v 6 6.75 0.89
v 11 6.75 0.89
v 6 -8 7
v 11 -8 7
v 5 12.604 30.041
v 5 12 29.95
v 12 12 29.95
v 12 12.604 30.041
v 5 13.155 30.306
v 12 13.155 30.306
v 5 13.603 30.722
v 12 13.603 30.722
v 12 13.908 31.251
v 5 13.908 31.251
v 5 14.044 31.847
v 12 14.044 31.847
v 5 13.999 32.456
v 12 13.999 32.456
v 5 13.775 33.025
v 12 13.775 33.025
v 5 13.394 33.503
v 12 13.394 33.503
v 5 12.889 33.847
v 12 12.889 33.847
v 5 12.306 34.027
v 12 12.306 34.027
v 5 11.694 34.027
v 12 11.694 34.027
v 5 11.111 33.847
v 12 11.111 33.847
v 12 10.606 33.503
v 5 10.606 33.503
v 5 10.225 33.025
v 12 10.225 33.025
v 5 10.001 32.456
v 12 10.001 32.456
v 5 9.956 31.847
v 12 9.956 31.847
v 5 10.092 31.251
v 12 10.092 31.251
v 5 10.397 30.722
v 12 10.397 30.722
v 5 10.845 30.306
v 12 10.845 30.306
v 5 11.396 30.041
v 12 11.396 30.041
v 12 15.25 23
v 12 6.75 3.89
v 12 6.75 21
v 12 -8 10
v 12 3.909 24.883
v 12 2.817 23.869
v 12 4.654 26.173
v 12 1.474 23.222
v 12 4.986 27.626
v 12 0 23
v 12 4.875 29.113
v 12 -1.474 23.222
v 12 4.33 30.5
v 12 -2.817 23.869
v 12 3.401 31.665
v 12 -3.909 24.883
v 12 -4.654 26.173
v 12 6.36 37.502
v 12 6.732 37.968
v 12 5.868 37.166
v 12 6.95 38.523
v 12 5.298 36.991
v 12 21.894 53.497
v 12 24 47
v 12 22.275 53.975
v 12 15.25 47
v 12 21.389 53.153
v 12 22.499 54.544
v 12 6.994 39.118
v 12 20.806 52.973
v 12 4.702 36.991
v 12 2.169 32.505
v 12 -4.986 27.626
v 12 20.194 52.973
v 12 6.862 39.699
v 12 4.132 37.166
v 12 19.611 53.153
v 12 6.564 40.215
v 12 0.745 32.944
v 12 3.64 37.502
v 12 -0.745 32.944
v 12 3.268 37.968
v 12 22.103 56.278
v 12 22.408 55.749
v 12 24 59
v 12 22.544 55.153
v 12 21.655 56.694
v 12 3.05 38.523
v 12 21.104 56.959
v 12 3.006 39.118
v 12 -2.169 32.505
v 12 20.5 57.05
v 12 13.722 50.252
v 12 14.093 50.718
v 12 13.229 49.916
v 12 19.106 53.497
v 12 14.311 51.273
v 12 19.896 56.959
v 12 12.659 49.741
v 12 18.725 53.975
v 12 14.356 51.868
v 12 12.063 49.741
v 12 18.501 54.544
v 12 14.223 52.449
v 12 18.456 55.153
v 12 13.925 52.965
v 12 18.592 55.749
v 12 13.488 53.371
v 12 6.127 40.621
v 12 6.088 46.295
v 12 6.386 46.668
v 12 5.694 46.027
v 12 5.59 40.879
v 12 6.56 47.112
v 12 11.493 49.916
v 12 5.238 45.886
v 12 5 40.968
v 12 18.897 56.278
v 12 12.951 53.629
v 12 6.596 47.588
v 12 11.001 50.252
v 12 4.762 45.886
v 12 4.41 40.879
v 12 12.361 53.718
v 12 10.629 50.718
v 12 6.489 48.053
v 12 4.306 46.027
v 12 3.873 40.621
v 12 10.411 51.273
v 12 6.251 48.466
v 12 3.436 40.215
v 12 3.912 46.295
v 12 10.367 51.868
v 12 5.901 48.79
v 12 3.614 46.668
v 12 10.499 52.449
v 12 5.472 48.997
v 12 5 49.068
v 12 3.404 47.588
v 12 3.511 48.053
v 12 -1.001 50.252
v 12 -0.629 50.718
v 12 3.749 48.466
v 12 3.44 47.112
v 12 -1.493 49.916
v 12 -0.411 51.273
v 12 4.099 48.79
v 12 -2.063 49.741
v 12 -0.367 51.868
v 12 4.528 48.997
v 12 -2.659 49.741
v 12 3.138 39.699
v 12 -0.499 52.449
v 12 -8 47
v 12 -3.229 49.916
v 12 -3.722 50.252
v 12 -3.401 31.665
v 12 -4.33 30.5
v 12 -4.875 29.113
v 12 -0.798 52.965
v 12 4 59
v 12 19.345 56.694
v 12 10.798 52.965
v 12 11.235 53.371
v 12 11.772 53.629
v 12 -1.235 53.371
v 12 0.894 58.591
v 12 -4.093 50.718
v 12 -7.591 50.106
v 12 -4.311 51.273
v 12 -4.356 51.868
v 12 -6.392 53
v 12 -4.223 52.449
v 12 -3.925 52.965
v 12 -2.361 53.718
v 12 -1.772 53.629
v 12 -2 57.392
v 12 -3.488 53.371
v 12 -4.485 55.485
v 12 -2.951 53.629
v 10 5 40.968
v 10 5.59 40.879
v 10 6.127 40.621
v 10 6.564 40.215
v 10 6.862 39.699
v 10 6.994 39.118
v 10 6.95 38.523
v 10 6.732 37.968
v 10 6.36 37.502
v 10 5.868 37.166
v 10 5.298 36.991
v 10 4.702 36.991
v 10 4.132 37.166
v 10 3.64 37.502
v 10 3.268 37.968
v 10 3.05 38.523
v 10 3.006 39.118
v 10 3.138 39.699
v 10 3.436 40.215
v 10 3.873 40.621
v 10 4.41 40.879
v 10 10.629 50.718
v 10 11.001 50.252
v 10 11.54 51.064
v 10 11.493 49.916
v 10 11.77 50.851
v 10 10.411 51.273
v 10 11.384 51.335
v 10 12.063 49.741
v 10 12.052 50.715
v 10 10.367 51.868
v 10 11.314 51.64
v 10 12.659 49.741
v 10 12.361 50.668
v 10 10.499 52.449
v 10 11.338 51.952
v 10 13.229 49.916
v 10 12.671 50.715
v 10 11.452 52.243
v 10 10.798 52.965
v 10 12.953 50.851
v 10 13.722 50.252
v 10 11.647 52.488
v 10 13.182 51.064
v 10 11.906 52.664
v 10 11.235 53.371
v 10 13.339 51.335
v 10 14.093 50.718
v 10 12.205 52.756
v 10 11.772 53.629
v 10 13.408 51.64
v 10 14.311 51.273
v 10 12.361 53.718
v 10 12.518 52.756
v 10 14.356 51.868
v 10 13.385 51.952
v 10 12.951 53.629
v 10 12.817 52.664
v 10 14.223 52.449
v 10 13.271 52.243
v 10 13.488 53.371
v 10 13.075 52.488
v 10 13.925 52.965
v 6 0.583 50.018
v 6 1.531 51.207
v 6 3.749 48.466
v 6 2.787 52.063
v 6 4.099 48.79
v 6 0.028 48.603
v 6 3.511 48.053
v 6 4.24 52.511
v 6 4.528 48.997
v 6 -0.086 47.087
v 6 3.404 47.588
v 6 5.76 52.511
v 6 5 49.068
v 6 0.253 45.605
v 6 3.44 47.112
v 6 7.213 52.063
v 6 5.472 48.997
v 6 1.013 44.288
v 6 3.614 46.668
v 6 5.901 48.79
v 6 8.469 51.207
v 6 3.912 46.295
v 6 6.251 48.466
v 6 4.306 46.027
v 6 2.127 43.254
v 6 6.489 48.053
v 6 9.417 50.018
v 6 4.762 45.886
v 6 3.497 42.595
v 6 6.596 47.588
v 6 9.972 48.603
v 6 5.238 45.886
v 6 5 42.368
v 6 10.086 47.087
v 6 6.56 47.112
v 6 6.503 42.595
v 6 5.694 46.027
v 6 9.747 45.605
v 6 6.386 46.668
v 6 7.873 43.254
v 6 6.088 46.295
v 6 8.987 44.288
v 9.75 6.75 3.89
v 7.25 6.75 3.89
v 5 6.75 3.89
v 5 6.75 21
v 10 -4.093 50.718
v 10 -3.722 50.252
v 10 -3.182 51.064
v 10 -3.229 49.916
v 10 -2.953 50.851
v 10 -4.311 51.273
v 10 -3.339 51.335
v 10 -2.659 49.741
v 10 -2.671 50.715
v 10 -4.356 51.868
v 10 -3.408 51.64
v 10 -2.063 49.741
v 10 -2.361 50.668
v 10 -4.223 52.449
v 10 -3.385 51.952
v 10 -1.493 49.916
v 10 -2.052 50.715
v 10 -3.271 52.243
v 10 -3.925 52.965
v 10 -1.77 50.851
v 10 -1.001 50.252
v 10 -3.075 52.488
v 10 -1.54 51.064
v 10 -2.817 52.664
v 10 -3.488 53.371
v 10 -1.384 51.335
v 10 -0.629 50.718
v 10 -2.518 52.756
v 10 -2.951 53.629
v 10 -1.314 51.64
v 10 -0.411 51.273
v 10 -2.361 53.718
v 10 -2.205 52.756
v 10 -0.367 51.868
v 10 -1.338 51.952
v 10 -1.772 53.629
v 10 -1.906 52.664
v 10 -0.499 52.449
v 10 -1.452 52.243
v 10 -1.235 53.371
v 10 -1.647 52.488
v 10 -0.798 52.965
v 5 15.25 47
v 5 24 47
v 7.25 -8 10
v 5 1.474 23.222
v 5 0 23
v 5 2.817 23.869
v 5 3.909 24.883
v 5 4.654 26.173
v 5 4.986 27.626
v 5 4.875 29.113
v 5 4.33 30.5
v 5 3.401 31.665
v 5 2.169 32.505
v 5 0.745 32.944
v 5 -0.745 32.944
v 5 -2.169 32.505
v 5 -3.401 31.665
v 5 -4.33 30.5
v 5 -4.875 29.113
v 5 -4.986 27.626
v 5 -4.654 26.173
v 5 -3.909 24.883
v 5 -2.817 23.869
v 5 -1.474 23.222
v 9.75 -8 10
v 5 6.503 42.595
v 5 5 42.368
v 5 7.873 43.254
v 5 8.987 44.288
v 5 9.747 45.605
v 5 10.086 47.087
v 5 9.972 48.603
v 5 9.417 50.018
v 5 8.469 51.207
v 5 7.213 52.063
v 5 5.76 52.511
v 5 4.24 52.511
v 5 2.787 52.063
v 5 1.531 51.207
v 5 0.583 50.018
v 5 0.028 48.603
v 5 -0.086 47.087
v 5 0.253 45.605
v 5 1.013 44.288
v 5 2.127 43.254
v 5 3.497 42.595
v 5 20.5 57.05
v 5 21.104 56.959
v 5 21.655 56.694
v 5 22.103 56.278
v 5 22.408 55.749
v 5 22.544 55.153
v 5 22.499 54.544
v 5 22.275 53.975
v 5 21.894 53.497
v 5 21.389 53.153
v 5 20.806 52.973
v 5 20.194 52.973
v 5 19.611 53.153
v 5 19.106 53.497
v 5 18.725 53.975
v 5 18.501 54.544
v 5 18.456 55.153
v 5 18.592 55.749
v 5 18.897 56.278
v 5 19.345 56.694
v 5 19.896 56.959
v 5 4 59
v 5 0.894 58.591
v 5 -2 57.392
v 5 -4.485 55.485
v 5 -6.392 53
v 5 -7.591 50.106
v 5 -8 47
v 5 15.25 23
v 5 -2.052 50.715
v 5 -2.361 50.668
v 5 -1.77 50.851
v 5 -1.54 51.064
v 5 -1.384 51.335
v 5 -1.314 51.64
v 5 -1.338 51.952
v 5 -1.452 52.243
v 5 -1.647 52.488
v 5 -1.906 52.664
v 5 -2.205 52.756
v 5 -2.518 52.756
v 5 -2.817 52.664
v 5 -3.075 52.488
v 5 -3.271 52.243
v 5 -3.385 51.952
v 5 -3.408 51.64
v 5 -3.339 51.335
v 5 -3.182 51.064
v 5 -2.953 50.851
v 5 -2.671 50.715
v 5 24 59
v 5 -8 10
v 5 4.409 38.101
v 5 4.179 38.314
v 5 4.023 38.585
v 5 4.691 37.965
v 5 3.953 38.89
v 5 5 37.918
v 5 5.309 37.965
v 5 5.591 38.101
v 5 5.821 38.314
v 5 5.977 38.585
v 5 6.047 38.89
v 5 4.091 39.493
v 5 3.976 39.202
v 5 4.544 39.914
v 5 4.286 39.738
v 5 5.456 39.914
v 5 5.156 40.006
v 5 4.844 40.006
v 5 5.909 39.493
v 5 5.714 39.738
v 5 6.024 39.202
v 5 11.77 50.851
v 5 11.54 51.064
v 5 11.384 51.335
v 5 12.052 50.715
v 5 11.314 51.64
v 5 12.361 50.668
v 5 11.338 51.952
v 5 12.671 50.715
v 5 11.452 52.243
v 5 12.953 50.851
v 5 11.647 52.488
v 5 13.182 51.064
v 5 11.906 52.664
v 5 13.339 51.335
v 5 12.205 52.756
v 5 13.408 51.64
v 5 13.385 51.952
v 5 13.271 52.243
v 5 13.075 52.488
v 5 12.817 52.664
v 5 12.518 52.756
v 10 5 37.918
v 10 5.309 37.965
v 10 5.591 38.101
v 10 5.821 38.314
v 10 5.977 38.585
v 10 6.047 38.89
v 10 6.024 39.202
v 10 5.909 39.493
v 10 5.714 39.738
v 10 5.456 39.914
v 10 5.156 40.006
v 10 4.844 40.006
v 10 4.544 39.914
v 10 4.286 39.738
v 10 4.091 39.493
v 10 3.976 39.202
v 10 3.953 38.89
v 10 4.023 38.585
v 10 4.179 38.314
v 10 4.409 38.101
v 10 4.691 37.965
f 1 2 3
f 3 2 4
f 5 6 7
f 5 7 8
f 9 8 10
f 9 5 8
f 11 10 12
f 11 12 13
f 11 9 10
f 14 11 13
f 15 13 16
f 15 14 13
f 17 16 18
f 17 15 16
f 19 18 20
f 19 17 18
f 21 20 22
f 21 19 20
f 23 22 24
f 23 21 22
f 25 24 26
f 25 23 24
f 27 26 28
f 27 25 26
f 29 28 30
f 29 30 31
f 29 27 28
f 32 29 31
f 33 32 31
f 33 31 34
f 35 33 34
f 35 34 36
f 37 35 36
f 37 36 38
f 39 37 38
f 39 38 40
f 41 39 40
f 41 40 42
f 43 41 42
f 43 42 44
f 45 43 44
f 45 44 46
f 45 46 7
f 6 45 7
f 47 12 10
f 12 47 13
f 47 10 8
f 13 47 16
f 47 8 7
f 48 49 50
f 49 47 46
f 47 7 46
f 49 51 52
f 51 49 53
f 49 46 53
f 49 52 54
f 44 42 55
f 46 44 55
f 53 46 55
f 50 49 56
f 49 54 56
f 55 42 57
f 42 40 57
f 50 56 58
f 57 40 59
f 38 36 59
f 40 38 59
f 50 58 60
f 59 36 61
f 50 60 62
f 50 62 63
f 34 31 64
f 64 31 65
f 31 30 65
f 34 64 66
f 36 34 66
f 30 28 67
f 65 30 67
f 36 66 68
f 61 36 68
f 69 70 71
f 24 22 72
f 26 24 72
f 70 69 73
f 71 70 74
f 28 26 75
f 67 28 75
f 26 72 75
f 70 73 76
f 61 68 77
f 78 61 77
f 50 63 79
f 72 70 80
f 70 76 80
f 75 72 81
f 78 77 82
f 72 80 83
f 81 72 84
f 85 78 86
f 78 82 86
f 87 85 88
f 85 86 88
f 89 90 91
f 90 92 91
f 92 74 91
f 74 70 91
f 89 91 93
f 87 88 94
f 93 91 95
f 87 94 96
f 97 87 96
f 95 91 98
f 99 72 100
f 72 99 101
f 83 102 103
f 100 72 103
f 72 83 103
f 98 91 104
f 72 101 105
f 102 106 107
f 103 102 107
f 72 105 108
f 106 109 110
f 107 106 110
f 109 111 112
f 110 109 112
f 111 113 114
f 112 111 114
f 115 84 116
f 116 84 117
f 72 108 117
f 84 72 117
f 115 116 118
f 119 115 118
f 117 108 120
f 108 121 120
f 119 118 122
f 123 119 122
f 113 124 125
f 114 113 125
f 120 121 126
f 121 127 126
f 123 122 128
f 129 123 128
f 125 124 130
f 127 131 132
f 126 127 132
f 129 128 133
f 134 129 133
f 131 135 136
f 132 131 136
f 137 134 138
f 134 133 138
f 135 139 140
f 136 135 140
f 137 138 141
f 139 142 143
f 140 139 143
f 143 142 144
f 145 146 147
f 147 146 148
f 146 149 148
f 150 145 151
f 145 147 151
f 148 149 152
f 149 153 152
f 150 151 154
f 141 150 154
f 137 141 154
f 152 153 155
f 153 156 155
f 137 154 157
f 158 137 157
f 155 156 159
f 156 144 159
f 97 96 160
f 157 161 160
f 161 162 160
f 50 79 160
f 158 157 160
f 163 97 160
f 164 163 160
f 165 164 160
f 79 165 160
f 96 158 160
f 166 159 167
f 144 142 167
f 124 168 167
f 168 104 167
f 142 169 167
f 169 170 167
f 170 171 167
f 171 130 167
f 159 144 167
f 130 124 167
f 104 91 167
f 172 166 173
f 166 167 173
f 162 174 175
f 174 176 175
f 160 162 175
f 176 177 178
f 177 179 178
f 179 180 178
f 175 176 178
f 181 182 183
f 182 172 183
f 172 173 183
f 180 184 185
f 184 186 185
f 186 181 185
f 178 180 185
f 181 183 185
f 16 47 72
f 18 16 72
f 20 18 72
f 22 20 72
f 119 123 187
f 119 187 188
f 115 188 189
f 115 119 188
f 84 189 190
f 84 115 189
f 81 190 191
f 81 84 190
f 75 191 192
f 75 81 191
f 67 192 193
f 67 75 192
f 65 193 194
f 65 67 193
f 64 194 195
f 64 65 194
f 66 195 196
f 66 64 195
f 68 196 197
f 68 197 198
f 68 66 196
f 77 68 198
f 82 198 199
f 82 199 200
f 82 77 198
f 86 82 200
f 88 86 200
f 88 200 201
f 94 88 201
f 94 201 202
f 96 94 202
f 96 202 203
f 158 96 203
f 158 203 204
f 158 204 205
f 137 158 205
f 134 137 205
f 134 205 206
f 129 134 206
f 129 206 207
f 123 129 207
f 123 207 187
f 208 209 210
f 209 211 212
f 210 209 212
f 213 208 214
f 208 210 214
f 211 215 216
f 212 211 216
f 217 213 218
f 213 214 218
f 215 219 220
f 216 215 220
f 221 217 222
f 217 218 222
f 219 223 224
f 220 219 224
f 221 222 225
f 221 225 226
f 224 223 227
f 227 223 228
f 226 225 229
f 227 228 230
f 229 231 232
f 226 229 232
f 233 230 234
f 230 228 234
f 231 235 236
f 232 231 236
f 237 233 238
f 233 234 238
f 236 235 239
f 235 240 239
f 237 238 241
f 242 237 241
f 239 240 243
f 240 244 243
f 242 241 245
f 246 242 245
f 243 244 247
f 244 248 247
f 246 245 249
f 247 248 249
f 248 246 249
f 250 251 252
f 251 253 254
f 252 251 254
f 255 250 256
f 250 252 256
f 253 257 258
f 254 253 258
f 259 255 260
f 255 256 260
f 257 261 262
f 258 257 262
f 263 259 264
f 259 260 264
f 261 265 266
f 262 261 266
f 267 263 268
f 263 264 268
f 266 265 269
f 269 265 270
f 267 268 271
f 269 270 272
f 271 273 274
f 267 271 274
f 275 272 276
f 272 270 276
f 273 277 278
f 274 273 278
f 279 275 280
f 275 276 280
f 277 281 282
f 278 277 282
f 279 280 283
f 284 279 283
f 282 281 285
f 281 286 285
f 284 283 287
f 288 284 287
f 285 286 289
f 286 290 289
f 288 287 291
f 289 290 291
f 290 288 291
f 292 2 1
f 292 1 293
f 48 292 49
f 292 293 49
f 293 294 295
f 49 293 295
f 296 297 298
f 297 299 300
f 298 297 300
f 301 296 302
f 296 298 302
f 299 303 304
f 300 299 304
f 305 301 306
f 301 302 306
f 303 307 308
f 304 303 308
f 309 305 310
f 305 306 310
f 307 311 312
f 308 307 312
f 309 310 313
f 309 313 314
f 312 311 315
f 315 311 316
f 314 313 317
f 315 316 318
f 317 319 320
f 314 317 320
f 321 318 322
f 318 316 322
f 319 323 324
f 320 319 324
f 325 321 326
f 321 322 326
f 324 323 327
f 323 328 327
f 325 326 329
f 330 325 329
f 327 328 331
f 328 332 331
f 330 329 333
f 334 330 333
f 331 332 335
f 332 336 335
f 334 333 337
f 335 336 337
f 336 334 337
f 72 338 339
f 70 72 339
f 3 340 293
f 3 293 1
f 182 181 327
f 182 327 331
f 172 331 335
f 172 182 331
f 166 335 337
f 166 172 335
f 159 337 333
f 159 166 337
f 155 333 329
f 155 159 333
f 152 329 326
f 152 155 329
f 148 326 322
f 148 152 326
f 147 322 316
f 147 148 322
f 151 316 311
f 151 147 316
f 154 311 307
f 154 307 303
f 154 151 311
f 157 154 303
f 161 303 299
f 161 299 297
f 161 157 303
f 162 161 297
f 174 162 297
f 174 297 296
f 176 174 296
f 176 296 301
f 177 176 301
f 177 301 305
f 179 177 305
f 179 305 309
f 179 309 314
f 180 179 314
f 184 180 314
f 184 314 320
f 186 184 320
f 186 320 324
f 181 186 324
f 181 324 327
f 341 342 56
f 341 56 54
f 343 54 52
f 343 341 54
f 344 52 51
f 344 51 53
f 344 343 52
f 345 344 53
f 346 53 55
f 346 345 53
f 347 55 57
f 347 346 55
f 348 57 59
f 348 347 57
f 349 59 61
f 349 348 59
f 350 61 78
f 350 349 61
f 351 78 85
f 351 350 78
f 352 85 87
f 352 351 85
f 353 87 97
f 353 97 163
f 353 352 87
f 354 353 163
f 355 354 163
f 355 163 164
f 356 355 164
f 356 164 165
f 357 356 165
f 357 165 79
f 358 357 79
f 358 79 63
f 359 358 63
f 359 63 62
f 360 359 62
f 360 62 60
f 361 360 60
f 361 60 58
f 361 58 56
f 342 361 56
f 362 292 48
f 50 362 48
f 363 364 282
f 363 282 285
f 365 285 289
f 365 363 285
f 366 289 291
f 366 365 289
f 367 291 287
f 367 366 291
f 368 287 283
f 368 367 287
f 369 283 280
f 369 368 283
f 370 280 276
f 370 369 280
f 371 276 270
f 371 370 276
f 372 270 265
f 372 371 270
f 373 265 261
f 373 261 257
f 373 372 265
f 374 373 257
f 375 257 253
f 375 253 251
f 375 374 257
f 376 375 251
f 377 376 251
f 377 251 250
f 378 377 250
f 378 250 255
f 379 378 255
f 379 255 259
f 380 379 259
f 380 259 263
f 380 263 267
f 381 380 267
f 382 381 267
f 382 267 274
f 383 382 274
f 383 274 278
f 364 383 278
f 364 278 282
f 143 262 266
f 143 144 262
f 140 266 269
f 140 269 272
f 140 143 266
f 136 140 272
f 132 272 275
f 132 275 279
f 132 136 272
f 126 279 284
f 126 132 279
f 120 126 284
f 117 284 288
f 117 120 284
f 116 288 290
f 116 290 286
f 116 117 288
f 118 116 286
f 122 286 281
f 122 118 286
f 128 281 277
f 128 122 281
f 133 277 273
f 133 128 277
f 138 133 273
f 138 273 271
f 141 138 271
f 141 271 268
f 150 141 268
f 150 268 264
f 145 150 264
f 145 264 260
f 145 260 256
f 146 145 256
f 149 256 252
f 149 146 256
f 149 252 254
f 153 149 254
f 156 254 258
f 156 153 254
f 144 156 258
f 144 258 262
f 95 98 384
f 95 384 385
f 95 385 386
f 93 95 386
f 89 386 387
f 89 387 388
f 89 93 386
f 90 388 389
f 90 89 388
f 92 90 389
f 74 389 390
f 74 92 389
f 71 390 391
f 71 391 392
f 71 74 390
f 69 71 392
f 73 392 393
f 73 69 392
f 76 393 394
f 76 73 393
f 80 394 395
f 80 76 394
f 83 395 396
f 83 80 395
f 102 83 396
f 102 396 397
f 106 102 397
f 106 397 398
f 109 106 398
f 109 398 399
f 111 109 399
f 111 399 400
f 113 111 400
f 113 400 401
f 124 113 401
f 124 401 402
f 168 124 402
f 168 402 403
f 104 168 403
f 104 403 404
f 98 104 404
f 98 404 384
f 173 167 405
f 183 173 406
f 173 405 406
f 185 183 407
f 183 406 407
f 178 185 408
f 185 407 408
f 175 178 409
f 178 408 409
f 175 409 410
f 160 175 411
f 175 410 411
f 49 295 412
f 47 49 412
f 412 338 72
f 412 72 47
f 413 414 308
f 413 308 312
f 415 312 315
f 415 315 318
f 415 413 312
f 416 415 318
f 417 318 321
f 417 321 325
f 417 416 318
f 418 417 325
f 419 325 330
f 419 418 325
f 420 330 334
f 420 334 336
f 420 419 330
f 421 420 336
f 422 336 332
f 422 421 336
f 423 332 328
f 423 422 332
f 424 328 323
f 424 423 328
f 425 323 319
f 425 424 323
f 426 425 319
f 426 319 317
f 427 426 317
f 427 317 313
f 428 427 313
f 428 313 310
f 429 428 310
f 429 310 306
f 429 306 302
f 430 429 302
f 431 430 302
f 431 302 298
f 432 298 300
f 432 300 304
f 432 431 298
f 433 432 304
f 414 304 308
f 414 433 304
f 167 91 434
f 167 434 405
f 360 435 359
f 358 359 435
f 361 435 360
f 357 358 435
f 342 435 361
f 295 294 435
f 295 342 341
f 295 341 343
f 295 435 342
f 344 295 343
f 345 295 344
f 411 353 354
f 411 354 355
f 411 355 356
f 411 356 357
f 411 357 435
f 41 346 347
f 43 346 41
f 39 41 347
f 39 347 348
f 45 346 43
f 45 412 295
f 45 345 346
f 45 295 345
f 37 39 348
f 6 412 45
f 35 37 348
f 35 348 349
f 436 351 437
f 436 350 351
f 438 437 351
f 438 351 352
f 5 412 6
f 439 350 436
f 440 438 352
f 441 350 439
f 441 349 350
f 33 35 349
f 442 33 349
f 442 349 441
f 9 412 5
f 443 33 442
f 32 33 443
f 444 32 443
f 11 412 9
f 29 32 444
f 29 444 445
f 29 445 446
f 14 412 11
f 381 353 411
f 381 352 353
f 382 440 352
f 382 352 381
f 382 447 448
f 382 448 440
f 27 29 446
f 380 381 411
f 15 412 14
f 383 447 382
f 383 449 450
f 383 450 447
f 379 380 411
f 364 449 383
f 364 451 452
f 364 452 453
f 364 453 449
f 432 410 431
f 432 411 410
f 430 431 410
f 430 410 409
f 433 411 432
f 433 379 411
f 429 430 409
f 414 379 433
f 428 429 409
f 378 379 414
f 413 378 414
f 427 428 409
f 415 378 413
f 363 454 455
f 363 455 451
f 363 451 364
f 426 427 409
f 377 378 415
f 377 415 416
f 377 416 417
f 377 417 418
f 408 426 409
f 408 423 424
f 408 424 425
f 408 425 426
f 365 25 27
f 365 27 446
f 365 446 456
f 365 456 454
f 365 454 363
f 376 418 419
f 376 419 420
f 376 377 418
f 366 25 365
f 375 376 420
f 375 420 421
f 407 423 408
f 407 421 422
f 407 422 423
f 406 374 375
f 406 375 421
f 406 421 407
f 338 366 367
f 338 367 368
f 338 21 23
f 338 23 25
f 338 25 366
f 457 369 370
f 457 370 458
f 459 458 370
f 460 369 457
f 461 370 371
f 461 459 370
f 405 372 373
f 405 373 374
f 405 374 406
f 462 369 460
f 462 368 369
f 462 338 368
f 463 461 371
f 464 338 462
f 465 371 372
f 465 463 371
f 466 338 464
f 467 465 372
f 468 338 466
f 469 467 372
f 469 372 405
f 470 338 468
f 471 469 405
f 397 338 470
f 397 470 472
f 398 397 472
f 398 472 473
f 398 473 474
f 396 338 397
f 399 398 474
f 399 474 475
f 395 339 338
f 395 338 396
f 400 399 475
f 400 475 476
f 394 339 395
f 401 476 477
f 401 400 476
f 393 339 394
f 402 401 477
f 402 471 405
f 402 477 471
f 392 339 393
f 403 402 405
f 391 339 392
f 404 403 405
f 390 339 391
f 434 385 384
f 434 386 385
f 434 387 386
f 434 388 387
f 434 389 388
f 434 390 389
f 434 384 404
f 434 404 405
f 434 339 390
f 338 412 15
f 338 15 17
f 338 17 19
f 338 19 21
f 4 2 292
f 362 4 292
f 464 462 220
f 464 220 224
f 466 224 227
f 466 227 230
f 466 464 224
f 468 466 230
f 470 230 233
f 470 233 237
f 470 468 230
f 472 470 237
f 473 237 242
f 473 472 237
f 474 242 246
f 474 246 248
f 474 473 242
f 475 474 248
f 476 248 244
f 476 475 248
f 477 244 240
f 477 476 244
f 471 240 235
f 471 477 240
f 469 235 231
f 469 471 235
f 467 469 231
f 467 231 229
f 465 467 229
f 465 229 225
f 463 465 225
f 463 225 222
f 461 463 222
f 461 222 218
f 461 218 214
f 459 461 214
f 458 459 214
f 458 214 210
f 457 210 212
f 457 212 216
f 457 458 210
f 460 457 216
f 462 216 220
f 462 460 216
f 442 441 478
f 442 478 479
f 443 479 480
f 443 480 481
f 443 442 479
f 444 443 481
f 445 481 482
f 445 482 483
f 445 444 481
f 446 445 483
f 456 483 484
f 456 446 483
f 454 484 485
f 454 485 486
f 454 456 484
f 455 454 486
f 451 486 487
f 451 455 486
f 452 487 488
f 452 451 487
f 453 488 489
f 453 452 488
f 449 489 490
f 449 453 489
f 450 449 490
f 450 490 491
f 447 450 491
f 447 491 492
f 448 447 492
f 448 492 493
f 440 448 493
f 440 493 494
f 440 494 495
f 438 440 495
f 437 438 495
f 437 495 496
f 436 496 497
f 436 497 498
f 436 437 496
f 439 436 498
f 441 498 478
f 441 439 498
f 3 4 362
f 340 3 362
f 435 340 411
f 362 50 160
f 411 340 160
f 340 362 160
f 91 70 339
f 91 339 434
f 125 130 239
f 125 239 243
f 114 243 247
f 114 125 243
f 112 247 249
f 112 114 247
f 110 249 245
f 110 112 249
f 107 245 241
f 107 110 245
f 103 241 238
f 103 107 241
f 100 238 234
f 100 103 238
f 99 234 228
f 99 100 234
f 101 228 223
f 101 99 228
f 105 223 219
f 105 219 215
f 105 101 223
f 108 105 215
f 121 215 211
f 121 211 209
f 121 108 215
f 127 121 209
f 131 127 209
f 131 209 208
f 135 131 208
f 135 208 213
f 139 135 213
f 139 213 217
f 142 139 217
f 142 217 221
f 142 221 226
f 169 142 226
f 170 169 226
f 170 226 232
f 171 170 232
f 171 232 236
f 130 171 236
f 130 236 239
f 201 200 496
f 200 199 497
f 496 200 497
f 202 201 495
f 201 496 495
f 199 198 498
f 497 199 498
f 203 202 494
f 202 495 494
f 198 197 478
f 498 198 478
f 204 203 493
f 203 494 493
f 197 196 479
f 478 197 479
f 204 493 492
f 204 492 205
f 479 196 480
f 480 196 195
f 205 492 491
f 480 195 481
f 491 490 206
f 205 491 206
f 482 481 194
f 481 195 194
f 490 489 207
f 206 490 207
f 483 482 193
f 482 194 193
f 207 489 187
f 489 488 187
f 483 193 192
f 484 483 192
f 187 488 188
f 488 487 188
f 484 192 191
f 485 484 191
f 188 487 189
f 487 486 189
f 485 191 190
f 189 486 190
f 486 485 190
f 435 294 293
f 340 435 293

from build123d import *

# Parameters (mm, degrees)
SKETCH1_W                                        = 32
SKETCH1_H                                        = 60
BOSS_EXTRUDE1_DEPTH                              = 7
SKETCH2_W                                        = 51
SKETCH2_H                                        = 8.75
CUT_EXTRUDE1_DEPTH                               = 65.078077374
CUT_EXTRUDE2_DEPTH                               = 65.078077374
F_10_0_10_DIAMETER_HOLE1_D                       = 10
F_10_0_10_DIAMETER_HOLE1_DEPTH                   = 14
M4X0_7_TAPPED_HOLE1_D                            = 2.1
M4X0_7_TAPPED_HOLE1_DEPTH                        = 14
M4X0_7_TAPPED_HOLE1_CBORE_D                      = 4
M4X0_7_TAPPED_HOLE1_CBORE_DEPTH                  = 2
CBORE_FOR_M3_HEX_HEAD_MACHINE_SCREW1_D           = 3.2
CBORE_FOR_M3_HEX_HEAD_MACHINE_SCREW1_CBORE_D     = 10.2
CBORE_FOR_M3_HEX_HEAD_MACHINE_SCREW1_CBORE_DEPTH = 1
F_4_1_4_1_DIAMETER_HOLE1_D                       = 4.1
F_4_1_4_1_DIAMETER_HOLE1_DEPTH                   = 14
F_4_1_4_1_DIAMETER_HOLE2_D                       = 4.1
FILLET3_R                                        = 12
CUT_EXTRUDE3_DEPTH                               = 65.078077374
SKETCH24_W                                       = 59.877724024
SKETCH24_H                                       = 41.345566777
CUT_EXTRUDE4_DEPTH                               = 7


# Read off the part's stored shape, not the designer's step: Mirror1
with BuildPart() as part:
    # Sketch1 → Boss-Extrude1 (new body)
    with BuildSketch(Plane(origin=(-2, 0, 0), x_dir=(0, -1, 0), z_dir=(-1, 0, 0))):
        with Locations((-8, 29)):
            Rectangle(SKETCH1_W, SKETCH1_H)
    extrude(amount=-BOSS_EXTRUDE1_DEPTH)

    # Sketch2 → Cut-Extrude1 (cut, through all)
    with BuildSketch(Plane(origin=(5, 0, 0), x_dir=(0, 0, -1), z_dir=(1, 0, 0))):
        with Locations((-21.5, 19.625)):
            Rectangle(SKETCH2_W, SKETCH2_H)
    extrude(amount=-CUT_EXTRUDE1_DEPTH, mode=Mode.SUBTRACT)

    # Sketch3 → Cut-Extrude2 (cut, through all)
    with BuildSketch(Plane(origin=(5, 0, 0), x_dir=(0, 0, -1), z_dir=(1, 0, 0))):
        Polygon((4, 6.75), (-21, 6.75), (-23, 15.25), (4, 15.25), align=None)
    extrude(amount=-CUT_EXTRUDE2_DEPTH, mode=Mode.SUBTRACT)

    # Ø10.0 (10) Diameter Hole1
    with Locations(Plane.ZY.offset(2)):
        with Locations((28, 0)):
            Hole(F_10_0_10_DIAMETER_HOLE1_D / 2, depth=F_10_0_10_DIAMETER_HOLE1_DEPTH)

    # M4x0.7 Tapped Hole1
    with Locations(Plane.ZY.offset(2)):
        with Locations((38.968179165, 5), (51.718179165, -2.361215932), (51.718179165, 12.361215932)):
            CounterBoreHole(M4X0_7_TAPPED_HOLE1_D / 2, M4X0_7_TAPPED_HOLE1_CBORE_D / 2, M4X0_7_TAPPED_HOLE1_CBORE_DEPTH, depth=M4X0_7_TAPPED_HOLE1_DEPTH)

    # CBORE for M3 Hex Head Machine Screw1 (through all)
    with Locations(Plane(origin=(5, 0, 0), x_dir=(0, 0, -1), z_dir=(1, 0, 0))):
        with Locations((-47.468179165, 5)):
            CounterBoreHole(CBORE_FOR_M3_HEX_HEAD_MACHINE_SCREW1_D / 2, CBORE_FOR_M3_HEX_HEAD_MACHINE_SCREW1_CBORE_D / 2, CBORE_FOR_M3_HEX_HEAD_MACHINE_SCREW1_CBORE_DEPTH)

    # Ø4.1 (4.1) Diameter Hole1
    with Locations(Plane.ZY.offset(2)):
        with Locations((32, 12)):
            Hole(F_4_1_4_1_DIAMETER_HOLE1_D / 2, depth=F_4_1_4_1_DIAMETER_HOLE1_DEPTH)

    # Ø4.1 (4.1) Diameter Hole2 (through all)
    with Locations(Plane(origin=(5, 0, 0), x_dir=(0, 0, -1), z_dir=(1, 0, 0))):
        with Locations((-55, 20.5)):
            Hole(F_4_1_4_1_DIAMETER_HOLE2_D / 2)

    # Fillet3
    fillet3_edges = [part.edges().sort_by_distance(p)[0] for p in [
        (1.5, -8, 59),
    ]]
    fillet(fillet3_edges, radius=FILLET3_R)

    # Cut-Sweep1: sweep along a path in Sketch22
    with BuildLine(Plane.ZY.offset(2)) as cut_sweep1_path:
        Line((-1, -8), (-8.402067684, 9.870172191))
    # Sketch21 → Cut-Sweep1 (sweep, cut)
    with BuildSketch(Plane.XZ.offset(8)):
        Polygon((-2, 10), (0.25, 10), (-1, 7), (-2, 7), align=None)
        Polygon((4, 7), (5, 7), (5, 10), (2.75, 10), align=None)
    sweep(path=cut_sweep1_path.line, mode=Mode.SUBTRACT)

    # Sketch23 → Cut-Extrude3 (cut, through all)
    with BuildSketch(Plane.ZY.offset(2)):
        Polygon((-1, 6.75), (0.890349955, 6.75), (7, -8), (-1, -8), align=None)
    extrude(amount=-CUT_EXTRUDE3_DEPTH, mode=Mode.SUBTRACT)

    # Mirror1: part across plane


with BuildPart() as part_1:
    add(part.part)
    add(part.part.mirror(Plane.ZY.offset(-5)))

    # Sketch24 → Cut-Extrude4 (cut)
    with BuildSketch(Plane.ZY.offset(2)):
        with Locations((29.938862012, 9.46680503)):
            Rectangle(SKETCH24_W, SKETCH24_H)
    extrude(amount=-CUT_EXTRUDE4_DEPTH, mode=Mode.SUBTRACT)


solid = part_1.part
